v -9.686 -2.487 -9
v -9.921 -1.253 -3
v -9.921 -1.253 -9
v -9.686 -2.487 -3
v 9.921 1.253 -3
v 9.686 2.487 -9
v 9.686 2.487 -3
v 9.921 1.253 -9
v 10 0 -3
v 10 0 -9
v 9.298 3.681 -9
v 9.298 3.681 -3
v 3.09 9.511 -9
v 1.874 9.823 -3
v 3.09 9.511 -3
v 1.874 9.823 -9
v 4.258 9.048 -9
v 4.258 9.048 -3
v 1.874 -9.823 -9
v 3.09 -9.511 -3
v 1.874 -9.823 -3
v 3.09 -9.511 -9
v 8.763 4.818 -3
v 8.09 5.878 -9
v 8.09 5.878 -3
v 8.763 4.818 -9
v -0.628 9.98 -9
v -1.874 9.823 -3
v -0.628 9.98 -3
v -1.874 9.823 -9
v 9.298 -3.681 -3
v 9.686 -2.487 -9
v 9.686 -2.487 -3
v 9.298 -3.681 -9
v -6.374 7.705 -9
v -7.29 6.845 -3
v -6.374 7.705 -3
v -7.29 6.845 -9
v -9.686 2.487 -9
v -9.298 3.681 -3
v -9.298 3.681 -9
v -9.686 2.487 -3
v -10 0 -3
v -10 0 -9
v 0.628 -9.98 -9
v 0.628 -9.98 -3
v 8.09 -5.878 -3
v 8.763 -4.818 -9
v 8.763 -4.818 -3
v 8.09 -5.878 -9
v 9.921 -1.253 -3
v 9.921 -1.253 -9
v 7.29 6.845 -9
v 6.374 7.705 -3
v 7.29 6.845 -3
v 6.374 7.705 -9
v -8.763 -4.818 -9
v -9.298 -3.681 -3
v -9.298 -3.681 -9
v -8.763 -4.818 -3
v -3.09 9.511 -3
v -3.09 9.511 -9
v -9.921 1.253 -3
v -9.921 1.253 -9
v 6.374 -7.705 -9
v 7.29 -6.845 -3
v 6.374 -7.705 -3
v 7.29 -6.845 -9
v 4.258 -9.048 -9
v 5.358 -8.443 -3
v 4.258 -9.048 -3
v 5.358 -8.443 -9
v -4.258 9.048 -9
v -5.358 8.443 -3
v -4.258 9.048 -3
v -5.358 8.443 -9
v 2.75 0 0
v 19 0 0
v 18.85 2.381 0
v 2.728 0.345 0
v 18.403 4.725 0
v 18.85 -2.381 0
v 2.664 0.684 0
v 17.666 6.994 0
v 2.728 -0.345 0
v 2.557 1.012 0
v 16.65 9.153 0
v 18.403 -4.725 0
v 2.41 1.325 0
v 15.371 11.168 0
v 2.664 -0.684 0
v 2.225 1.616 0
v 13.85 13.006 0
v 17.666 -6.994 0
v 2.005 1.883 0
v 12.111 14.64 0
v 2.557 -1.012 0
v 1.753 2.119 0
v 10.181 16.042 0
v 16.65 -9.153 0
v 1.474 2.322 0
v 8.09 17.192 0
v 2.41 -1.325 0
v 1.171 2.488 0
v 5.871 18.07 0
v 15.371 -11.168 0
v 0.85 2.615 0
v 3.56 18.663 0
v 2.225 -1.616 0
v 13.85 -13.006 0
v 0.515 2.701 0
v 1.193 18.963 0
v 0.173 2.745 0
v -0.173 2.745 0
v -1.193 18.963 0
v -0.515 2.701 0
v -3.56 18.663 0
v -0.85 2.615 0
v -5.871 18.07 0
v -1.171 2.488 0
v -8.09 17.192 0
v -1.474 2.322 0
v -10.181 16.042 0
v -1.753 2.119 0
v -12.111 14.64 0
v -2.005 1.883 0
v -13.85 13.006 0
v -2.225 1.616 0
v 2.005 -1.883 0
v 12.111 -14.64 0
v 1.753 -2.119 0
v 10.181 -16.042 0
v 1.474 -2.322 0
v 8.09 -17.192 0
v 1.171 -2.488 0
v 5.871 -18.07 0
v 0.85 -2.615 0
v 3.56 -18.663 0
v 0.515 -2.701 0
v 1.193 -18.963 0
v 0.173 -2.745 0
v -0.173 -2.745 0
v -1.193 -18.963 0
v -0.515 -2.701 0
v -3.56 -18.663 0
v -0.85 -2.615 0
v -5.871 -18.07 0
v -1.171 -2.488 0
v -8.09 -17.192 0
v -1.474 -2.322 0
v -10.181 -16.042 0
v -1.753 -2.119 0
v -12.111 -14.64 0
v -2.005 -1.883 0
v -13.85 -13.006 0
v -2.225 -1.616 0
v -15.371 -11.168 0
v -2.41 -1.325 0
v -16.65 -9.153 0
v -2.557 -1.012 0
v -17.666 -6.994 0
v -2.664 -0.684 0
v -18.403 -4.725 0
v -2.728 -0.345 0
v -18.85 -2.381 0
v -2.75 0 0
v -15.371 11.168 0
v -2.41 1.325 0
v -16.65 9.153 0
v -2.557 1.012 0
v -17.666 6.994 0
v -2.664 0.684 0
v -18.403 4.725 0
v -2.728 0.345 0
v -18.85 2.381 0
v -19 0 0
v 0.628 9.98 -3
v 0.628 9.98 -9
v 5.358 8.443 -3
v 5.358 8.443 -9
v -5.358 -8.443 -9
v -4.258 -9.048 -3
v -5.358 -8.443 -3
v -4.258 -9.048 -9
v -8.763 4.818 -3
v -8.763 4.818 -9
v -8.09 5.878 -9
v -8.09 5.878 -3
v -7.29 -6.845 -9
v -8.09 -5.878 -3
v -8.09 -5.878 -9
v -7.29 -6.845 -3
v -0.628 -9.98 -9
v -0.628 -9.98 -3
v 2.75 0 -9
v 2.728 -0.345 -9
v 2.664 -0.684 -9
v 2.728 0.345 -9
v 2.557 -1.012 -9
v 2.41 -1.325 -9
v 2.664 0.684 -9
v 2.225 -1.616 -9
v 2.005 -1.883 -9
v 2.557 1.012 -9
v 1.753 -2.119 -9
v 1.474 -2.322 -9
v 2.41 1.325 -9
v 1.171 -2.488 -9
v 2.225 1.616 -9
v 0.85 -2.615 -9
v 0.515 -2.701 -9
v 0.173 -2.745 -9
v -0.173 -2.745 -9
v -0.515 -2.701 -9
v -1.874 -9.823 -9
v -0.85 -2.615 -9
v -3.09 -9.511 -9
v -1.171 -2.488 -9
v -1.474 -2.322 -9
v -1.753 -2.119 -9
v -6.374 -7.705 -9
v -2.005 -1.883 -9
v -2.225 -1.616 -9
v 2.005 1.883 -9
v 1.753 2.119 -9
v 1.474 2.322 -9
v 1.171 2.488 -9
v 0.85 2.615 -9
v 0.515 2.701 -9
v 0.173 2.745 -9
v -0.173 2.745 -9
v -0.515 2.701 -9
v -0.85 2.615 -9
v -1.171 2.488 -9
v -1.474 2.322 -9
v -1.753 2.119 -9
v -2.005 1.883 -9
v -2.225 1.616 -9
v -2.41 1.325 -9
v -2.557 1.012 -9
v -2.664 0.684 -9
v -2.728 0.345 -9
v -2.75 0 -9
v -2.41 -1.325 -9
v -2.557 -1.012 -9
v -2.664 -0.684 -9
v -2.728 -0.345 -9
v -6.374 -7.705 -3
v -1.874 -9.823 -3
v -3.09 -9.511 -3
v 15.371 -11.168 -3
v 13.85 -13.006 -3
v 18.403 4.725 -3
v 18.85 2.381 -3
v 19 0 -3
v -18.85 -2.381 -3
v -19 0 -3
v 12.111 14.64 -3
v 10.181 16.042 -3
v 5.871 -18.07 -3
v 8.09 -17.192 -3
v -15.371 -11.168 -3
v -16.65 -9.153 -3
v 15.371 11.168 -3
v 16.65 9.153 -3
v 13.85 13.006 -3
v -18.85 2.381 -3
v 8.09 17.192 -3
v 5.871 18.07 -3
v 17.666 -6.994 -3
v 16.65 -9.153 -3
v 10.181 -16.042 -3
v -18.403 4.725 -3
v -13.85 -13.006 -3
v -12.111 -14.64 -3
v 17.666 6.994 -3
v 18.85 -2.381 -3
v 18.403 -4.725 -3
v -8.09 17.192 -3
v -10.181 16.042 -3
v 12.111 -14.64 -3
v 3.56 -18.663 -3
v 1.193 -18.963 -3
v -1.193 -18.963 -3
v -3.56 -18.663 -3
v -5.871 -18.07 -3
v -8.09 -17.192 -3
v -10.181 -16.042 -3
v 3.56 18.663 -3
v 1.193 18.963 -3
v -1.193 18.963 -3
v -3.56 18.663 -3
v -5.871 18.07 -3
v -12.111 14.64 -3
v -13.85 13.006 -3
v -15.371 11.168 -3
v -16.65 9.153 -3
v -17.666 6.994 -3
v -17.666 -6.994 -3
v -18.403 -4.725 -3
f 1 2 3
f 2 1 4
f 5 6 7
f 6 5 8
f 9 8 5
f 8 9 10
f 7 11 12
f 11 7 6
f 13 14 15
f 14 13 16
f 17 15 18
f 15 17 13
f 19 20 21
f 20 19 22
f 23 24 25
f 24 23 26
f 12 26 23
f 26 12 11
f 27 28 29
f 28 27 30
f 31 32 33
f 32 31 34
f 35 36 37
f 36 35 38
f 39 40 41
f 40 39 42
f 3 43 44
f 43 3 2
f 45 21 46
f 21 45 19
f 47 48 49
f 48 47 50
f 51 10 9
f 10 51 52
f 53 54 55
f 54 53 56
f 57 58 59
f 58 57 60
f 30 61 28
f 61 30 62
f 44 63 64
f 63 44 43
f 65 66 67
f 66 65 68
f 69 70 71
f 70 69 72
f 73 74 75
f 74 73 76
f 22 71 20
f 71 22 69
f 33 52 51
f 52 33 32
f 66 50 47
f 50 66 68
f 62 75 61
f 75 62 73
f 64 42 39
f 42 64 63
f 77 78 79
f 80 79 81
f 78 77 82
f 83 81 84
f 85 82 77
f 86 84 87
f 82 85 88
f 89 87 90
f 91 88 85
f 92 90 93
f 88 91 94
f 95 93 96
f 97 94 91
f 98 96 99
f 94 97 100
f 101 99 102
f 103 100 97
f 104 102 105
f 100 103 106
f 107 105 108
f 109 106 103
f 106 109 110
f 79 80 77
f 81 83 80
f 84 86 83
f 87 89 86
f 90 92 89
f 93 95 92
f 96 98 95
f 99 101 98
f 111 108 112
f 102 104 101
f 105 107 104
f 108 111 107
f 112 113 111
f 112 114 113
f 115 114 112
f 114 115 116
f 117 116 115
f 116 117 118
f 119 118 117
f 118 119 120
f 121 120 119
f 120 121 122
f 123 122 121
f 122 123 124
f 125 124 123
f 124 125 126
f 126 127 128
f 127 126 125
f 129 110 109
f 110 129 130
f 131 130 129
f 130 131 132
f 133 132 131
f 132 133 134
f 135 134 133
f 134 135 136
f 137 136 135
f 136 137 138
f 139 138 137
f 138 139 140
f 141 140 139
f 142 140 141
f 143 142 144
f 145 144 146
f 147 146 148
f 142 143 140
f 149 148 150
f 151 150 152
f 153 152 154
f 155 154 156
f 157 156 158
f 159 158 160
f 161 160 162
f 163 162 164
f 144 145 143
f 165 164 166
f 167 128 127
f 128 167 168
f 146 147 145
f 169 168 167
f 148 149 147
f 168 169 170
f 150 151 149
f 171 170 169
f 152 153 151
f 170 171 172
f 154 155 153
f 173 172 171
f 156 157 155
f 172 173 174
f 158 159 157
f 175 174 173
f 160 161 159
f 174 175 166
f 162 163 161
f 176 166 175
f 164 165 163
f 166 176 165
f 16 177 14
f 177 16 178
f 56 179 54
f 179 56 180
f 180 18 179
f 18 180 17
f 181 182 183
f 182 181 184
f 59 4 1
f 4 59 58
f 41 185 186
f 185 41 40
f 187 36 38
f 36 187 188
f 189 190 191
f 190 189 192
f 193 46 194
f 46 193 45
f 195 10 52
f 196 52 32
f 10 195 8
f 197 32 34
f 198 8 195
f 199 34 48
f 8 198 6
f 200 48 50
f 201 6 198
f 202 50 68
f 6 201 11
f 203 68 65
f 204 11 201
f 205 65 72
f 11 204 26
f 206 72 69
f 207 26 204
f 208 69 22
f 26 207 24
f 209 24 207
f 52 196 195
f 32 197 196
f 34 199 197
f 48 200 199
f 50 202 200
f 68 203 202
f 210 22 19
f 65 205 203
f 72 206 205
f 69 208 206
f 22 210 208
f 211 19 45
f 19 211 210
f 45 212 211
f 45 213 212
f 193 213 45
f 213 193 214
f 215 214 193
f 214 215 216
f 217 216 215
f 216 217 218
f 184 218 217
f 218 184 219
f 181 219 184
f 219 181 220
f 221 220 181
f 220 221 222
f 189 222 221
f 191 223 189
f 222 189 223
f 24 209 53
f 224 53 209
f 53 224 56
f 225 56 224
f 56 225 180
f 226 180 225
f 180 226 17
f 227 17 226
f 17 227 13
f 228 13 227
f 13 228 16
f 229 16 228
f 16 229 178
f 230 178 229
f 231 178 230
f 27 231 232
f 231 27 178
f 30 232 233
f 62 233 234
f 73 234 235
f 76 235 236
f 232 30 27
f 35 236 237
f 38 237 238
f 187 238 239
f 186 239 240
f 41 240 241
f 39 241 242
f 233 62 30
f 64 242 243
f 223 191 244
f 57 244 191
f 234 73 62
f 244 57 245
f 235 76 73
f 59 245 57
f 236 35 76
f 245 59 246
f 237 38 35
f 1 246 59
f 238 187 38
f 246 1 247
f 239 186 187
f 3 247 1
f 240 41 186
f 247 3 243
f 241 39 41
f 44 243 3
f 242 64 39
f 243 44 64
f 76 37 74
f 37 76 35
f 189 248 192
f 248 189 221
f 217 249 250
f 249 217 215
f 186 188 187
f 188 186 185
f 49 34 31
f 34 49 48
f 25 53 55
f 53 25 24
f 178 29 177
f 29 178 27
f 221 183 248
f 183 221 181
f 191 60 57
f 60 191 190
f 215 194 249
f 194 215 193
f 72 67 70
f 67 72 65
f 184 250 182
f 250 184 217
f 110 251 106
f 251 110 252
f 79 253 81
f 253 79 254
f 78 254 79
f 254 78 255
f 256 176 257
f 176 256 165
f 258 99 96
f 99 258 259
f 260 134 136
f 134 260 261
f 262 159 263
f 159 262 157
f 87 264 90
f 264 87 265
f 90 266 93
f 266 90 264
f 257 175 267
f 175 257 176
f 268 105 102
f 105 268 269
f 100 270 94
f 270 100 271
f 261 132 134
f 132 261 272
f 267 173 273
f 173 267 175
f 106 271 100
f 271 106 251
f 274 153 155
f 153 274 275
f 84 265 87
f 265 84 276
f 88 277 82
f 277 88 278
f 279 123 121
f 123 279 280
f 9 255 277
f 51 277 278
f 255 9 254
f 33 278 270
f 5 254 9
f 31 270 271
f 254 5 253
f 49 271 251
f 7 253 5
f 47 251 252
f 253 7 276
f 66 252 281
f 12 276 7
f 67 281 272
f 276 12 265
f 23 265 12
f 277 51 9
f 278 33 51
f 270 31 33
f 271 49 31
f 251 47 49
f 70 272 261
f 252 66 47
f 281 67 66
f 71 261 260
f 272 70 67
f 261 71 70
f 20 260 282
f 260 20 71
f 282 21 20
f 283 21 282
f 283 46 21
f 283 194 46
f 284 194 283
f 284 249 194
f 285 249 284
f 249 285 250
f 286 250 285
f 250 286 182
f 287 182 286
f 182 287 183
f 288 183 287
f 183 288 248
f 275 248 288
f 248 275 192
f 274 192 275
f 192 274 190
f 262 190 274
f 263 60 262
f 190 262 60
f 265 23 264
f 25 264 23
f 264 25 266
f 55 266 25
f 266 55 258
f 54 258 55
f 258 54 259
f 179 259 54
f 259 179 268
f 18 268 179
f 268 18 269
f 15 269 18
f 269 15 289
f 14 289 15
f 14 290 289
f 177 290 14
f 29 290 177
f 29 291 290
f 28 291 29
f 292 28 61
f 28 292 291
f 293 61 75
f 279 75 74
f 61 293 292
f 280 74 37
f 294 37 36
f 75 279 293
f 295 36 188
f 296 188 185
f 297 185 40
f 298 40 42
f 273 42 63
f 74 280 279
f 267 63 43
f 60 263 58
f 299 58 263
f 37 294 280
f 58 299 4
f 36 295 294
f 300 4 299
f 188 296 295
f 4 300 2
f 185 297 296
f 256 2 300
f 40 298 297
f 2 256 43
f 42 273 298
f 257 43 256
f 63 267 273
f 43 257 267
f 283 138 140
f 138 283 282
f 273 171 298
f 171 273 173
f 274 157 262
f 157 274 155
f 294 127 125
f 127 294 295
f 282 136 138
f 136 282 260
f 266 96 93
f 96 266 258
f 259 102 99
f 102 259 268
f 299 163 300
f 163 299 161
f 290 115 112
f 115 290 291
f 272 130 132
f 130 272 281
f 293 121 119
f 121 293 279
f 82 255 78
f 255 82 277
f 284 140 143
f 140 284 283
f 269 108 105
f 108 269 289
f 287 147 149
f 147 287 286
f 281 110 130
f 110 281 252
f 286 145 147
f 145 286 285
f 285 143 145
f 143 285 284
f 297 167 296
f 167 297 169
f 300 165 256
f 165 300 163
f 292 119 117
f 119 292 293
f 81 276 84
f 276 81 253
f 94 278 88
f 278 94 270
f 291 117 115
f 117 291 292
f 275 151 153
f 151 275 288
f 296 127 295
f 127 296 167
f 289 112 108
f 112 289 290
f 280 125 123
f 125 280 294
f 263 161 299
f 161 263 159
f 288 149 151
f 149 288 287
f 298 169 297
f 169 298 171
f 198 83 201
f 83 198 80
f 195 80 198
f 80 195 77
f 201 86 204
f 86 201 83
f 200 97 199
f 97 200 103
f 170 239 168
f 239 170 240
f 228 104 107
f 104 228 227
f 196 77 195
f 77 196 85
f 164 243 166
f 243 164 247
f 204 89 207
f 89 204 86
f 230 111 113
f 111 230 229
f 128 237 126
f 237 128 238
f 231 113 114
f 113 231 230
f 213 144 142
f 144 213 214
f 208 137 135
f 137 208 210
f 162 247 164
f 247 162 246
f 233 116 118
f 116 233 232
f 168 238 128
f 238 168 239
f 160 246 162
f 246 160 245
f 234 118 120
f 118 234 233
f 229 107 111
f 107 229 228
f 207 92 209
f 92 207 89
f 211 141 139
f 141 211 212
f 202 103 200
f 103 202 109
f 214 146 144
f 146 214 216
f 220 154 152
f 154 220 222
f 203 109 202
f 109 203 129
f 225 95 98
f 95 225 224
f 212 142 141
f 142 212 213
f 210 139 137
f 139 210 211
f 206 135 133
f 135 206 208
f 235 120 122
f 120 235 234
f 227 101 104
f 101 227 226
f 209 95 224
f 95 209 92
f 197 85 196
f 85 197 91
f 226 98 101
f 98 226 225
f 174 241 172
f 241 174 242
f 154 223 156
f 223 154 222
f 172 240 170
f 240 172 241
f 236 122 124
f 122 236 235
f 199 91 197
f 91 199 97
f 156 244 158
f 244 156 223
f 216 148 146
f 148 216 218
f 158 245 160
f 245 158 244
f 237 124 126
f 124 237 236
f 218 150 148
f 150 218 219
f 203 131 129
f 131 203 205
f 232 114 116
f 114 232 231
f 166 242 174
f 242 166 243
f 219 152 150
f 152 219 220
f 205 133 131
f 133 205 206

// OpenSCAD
$fn = 50;


difference() {
	union() {
		translate(v = [0, 0, -9.0000000000]) {
			cylinder(h = 9, r = 10.0000000000);
		}
		translate(v = [0, 0, -3.0000000000]) {
			cylinder(h = 3, r = 19.0000000000);
		}
	}
	union() {
		#translate(v = [0, 0, -9]) {
			cylinder(h = 9, r = 2.7500000000);
		}
	}
}
